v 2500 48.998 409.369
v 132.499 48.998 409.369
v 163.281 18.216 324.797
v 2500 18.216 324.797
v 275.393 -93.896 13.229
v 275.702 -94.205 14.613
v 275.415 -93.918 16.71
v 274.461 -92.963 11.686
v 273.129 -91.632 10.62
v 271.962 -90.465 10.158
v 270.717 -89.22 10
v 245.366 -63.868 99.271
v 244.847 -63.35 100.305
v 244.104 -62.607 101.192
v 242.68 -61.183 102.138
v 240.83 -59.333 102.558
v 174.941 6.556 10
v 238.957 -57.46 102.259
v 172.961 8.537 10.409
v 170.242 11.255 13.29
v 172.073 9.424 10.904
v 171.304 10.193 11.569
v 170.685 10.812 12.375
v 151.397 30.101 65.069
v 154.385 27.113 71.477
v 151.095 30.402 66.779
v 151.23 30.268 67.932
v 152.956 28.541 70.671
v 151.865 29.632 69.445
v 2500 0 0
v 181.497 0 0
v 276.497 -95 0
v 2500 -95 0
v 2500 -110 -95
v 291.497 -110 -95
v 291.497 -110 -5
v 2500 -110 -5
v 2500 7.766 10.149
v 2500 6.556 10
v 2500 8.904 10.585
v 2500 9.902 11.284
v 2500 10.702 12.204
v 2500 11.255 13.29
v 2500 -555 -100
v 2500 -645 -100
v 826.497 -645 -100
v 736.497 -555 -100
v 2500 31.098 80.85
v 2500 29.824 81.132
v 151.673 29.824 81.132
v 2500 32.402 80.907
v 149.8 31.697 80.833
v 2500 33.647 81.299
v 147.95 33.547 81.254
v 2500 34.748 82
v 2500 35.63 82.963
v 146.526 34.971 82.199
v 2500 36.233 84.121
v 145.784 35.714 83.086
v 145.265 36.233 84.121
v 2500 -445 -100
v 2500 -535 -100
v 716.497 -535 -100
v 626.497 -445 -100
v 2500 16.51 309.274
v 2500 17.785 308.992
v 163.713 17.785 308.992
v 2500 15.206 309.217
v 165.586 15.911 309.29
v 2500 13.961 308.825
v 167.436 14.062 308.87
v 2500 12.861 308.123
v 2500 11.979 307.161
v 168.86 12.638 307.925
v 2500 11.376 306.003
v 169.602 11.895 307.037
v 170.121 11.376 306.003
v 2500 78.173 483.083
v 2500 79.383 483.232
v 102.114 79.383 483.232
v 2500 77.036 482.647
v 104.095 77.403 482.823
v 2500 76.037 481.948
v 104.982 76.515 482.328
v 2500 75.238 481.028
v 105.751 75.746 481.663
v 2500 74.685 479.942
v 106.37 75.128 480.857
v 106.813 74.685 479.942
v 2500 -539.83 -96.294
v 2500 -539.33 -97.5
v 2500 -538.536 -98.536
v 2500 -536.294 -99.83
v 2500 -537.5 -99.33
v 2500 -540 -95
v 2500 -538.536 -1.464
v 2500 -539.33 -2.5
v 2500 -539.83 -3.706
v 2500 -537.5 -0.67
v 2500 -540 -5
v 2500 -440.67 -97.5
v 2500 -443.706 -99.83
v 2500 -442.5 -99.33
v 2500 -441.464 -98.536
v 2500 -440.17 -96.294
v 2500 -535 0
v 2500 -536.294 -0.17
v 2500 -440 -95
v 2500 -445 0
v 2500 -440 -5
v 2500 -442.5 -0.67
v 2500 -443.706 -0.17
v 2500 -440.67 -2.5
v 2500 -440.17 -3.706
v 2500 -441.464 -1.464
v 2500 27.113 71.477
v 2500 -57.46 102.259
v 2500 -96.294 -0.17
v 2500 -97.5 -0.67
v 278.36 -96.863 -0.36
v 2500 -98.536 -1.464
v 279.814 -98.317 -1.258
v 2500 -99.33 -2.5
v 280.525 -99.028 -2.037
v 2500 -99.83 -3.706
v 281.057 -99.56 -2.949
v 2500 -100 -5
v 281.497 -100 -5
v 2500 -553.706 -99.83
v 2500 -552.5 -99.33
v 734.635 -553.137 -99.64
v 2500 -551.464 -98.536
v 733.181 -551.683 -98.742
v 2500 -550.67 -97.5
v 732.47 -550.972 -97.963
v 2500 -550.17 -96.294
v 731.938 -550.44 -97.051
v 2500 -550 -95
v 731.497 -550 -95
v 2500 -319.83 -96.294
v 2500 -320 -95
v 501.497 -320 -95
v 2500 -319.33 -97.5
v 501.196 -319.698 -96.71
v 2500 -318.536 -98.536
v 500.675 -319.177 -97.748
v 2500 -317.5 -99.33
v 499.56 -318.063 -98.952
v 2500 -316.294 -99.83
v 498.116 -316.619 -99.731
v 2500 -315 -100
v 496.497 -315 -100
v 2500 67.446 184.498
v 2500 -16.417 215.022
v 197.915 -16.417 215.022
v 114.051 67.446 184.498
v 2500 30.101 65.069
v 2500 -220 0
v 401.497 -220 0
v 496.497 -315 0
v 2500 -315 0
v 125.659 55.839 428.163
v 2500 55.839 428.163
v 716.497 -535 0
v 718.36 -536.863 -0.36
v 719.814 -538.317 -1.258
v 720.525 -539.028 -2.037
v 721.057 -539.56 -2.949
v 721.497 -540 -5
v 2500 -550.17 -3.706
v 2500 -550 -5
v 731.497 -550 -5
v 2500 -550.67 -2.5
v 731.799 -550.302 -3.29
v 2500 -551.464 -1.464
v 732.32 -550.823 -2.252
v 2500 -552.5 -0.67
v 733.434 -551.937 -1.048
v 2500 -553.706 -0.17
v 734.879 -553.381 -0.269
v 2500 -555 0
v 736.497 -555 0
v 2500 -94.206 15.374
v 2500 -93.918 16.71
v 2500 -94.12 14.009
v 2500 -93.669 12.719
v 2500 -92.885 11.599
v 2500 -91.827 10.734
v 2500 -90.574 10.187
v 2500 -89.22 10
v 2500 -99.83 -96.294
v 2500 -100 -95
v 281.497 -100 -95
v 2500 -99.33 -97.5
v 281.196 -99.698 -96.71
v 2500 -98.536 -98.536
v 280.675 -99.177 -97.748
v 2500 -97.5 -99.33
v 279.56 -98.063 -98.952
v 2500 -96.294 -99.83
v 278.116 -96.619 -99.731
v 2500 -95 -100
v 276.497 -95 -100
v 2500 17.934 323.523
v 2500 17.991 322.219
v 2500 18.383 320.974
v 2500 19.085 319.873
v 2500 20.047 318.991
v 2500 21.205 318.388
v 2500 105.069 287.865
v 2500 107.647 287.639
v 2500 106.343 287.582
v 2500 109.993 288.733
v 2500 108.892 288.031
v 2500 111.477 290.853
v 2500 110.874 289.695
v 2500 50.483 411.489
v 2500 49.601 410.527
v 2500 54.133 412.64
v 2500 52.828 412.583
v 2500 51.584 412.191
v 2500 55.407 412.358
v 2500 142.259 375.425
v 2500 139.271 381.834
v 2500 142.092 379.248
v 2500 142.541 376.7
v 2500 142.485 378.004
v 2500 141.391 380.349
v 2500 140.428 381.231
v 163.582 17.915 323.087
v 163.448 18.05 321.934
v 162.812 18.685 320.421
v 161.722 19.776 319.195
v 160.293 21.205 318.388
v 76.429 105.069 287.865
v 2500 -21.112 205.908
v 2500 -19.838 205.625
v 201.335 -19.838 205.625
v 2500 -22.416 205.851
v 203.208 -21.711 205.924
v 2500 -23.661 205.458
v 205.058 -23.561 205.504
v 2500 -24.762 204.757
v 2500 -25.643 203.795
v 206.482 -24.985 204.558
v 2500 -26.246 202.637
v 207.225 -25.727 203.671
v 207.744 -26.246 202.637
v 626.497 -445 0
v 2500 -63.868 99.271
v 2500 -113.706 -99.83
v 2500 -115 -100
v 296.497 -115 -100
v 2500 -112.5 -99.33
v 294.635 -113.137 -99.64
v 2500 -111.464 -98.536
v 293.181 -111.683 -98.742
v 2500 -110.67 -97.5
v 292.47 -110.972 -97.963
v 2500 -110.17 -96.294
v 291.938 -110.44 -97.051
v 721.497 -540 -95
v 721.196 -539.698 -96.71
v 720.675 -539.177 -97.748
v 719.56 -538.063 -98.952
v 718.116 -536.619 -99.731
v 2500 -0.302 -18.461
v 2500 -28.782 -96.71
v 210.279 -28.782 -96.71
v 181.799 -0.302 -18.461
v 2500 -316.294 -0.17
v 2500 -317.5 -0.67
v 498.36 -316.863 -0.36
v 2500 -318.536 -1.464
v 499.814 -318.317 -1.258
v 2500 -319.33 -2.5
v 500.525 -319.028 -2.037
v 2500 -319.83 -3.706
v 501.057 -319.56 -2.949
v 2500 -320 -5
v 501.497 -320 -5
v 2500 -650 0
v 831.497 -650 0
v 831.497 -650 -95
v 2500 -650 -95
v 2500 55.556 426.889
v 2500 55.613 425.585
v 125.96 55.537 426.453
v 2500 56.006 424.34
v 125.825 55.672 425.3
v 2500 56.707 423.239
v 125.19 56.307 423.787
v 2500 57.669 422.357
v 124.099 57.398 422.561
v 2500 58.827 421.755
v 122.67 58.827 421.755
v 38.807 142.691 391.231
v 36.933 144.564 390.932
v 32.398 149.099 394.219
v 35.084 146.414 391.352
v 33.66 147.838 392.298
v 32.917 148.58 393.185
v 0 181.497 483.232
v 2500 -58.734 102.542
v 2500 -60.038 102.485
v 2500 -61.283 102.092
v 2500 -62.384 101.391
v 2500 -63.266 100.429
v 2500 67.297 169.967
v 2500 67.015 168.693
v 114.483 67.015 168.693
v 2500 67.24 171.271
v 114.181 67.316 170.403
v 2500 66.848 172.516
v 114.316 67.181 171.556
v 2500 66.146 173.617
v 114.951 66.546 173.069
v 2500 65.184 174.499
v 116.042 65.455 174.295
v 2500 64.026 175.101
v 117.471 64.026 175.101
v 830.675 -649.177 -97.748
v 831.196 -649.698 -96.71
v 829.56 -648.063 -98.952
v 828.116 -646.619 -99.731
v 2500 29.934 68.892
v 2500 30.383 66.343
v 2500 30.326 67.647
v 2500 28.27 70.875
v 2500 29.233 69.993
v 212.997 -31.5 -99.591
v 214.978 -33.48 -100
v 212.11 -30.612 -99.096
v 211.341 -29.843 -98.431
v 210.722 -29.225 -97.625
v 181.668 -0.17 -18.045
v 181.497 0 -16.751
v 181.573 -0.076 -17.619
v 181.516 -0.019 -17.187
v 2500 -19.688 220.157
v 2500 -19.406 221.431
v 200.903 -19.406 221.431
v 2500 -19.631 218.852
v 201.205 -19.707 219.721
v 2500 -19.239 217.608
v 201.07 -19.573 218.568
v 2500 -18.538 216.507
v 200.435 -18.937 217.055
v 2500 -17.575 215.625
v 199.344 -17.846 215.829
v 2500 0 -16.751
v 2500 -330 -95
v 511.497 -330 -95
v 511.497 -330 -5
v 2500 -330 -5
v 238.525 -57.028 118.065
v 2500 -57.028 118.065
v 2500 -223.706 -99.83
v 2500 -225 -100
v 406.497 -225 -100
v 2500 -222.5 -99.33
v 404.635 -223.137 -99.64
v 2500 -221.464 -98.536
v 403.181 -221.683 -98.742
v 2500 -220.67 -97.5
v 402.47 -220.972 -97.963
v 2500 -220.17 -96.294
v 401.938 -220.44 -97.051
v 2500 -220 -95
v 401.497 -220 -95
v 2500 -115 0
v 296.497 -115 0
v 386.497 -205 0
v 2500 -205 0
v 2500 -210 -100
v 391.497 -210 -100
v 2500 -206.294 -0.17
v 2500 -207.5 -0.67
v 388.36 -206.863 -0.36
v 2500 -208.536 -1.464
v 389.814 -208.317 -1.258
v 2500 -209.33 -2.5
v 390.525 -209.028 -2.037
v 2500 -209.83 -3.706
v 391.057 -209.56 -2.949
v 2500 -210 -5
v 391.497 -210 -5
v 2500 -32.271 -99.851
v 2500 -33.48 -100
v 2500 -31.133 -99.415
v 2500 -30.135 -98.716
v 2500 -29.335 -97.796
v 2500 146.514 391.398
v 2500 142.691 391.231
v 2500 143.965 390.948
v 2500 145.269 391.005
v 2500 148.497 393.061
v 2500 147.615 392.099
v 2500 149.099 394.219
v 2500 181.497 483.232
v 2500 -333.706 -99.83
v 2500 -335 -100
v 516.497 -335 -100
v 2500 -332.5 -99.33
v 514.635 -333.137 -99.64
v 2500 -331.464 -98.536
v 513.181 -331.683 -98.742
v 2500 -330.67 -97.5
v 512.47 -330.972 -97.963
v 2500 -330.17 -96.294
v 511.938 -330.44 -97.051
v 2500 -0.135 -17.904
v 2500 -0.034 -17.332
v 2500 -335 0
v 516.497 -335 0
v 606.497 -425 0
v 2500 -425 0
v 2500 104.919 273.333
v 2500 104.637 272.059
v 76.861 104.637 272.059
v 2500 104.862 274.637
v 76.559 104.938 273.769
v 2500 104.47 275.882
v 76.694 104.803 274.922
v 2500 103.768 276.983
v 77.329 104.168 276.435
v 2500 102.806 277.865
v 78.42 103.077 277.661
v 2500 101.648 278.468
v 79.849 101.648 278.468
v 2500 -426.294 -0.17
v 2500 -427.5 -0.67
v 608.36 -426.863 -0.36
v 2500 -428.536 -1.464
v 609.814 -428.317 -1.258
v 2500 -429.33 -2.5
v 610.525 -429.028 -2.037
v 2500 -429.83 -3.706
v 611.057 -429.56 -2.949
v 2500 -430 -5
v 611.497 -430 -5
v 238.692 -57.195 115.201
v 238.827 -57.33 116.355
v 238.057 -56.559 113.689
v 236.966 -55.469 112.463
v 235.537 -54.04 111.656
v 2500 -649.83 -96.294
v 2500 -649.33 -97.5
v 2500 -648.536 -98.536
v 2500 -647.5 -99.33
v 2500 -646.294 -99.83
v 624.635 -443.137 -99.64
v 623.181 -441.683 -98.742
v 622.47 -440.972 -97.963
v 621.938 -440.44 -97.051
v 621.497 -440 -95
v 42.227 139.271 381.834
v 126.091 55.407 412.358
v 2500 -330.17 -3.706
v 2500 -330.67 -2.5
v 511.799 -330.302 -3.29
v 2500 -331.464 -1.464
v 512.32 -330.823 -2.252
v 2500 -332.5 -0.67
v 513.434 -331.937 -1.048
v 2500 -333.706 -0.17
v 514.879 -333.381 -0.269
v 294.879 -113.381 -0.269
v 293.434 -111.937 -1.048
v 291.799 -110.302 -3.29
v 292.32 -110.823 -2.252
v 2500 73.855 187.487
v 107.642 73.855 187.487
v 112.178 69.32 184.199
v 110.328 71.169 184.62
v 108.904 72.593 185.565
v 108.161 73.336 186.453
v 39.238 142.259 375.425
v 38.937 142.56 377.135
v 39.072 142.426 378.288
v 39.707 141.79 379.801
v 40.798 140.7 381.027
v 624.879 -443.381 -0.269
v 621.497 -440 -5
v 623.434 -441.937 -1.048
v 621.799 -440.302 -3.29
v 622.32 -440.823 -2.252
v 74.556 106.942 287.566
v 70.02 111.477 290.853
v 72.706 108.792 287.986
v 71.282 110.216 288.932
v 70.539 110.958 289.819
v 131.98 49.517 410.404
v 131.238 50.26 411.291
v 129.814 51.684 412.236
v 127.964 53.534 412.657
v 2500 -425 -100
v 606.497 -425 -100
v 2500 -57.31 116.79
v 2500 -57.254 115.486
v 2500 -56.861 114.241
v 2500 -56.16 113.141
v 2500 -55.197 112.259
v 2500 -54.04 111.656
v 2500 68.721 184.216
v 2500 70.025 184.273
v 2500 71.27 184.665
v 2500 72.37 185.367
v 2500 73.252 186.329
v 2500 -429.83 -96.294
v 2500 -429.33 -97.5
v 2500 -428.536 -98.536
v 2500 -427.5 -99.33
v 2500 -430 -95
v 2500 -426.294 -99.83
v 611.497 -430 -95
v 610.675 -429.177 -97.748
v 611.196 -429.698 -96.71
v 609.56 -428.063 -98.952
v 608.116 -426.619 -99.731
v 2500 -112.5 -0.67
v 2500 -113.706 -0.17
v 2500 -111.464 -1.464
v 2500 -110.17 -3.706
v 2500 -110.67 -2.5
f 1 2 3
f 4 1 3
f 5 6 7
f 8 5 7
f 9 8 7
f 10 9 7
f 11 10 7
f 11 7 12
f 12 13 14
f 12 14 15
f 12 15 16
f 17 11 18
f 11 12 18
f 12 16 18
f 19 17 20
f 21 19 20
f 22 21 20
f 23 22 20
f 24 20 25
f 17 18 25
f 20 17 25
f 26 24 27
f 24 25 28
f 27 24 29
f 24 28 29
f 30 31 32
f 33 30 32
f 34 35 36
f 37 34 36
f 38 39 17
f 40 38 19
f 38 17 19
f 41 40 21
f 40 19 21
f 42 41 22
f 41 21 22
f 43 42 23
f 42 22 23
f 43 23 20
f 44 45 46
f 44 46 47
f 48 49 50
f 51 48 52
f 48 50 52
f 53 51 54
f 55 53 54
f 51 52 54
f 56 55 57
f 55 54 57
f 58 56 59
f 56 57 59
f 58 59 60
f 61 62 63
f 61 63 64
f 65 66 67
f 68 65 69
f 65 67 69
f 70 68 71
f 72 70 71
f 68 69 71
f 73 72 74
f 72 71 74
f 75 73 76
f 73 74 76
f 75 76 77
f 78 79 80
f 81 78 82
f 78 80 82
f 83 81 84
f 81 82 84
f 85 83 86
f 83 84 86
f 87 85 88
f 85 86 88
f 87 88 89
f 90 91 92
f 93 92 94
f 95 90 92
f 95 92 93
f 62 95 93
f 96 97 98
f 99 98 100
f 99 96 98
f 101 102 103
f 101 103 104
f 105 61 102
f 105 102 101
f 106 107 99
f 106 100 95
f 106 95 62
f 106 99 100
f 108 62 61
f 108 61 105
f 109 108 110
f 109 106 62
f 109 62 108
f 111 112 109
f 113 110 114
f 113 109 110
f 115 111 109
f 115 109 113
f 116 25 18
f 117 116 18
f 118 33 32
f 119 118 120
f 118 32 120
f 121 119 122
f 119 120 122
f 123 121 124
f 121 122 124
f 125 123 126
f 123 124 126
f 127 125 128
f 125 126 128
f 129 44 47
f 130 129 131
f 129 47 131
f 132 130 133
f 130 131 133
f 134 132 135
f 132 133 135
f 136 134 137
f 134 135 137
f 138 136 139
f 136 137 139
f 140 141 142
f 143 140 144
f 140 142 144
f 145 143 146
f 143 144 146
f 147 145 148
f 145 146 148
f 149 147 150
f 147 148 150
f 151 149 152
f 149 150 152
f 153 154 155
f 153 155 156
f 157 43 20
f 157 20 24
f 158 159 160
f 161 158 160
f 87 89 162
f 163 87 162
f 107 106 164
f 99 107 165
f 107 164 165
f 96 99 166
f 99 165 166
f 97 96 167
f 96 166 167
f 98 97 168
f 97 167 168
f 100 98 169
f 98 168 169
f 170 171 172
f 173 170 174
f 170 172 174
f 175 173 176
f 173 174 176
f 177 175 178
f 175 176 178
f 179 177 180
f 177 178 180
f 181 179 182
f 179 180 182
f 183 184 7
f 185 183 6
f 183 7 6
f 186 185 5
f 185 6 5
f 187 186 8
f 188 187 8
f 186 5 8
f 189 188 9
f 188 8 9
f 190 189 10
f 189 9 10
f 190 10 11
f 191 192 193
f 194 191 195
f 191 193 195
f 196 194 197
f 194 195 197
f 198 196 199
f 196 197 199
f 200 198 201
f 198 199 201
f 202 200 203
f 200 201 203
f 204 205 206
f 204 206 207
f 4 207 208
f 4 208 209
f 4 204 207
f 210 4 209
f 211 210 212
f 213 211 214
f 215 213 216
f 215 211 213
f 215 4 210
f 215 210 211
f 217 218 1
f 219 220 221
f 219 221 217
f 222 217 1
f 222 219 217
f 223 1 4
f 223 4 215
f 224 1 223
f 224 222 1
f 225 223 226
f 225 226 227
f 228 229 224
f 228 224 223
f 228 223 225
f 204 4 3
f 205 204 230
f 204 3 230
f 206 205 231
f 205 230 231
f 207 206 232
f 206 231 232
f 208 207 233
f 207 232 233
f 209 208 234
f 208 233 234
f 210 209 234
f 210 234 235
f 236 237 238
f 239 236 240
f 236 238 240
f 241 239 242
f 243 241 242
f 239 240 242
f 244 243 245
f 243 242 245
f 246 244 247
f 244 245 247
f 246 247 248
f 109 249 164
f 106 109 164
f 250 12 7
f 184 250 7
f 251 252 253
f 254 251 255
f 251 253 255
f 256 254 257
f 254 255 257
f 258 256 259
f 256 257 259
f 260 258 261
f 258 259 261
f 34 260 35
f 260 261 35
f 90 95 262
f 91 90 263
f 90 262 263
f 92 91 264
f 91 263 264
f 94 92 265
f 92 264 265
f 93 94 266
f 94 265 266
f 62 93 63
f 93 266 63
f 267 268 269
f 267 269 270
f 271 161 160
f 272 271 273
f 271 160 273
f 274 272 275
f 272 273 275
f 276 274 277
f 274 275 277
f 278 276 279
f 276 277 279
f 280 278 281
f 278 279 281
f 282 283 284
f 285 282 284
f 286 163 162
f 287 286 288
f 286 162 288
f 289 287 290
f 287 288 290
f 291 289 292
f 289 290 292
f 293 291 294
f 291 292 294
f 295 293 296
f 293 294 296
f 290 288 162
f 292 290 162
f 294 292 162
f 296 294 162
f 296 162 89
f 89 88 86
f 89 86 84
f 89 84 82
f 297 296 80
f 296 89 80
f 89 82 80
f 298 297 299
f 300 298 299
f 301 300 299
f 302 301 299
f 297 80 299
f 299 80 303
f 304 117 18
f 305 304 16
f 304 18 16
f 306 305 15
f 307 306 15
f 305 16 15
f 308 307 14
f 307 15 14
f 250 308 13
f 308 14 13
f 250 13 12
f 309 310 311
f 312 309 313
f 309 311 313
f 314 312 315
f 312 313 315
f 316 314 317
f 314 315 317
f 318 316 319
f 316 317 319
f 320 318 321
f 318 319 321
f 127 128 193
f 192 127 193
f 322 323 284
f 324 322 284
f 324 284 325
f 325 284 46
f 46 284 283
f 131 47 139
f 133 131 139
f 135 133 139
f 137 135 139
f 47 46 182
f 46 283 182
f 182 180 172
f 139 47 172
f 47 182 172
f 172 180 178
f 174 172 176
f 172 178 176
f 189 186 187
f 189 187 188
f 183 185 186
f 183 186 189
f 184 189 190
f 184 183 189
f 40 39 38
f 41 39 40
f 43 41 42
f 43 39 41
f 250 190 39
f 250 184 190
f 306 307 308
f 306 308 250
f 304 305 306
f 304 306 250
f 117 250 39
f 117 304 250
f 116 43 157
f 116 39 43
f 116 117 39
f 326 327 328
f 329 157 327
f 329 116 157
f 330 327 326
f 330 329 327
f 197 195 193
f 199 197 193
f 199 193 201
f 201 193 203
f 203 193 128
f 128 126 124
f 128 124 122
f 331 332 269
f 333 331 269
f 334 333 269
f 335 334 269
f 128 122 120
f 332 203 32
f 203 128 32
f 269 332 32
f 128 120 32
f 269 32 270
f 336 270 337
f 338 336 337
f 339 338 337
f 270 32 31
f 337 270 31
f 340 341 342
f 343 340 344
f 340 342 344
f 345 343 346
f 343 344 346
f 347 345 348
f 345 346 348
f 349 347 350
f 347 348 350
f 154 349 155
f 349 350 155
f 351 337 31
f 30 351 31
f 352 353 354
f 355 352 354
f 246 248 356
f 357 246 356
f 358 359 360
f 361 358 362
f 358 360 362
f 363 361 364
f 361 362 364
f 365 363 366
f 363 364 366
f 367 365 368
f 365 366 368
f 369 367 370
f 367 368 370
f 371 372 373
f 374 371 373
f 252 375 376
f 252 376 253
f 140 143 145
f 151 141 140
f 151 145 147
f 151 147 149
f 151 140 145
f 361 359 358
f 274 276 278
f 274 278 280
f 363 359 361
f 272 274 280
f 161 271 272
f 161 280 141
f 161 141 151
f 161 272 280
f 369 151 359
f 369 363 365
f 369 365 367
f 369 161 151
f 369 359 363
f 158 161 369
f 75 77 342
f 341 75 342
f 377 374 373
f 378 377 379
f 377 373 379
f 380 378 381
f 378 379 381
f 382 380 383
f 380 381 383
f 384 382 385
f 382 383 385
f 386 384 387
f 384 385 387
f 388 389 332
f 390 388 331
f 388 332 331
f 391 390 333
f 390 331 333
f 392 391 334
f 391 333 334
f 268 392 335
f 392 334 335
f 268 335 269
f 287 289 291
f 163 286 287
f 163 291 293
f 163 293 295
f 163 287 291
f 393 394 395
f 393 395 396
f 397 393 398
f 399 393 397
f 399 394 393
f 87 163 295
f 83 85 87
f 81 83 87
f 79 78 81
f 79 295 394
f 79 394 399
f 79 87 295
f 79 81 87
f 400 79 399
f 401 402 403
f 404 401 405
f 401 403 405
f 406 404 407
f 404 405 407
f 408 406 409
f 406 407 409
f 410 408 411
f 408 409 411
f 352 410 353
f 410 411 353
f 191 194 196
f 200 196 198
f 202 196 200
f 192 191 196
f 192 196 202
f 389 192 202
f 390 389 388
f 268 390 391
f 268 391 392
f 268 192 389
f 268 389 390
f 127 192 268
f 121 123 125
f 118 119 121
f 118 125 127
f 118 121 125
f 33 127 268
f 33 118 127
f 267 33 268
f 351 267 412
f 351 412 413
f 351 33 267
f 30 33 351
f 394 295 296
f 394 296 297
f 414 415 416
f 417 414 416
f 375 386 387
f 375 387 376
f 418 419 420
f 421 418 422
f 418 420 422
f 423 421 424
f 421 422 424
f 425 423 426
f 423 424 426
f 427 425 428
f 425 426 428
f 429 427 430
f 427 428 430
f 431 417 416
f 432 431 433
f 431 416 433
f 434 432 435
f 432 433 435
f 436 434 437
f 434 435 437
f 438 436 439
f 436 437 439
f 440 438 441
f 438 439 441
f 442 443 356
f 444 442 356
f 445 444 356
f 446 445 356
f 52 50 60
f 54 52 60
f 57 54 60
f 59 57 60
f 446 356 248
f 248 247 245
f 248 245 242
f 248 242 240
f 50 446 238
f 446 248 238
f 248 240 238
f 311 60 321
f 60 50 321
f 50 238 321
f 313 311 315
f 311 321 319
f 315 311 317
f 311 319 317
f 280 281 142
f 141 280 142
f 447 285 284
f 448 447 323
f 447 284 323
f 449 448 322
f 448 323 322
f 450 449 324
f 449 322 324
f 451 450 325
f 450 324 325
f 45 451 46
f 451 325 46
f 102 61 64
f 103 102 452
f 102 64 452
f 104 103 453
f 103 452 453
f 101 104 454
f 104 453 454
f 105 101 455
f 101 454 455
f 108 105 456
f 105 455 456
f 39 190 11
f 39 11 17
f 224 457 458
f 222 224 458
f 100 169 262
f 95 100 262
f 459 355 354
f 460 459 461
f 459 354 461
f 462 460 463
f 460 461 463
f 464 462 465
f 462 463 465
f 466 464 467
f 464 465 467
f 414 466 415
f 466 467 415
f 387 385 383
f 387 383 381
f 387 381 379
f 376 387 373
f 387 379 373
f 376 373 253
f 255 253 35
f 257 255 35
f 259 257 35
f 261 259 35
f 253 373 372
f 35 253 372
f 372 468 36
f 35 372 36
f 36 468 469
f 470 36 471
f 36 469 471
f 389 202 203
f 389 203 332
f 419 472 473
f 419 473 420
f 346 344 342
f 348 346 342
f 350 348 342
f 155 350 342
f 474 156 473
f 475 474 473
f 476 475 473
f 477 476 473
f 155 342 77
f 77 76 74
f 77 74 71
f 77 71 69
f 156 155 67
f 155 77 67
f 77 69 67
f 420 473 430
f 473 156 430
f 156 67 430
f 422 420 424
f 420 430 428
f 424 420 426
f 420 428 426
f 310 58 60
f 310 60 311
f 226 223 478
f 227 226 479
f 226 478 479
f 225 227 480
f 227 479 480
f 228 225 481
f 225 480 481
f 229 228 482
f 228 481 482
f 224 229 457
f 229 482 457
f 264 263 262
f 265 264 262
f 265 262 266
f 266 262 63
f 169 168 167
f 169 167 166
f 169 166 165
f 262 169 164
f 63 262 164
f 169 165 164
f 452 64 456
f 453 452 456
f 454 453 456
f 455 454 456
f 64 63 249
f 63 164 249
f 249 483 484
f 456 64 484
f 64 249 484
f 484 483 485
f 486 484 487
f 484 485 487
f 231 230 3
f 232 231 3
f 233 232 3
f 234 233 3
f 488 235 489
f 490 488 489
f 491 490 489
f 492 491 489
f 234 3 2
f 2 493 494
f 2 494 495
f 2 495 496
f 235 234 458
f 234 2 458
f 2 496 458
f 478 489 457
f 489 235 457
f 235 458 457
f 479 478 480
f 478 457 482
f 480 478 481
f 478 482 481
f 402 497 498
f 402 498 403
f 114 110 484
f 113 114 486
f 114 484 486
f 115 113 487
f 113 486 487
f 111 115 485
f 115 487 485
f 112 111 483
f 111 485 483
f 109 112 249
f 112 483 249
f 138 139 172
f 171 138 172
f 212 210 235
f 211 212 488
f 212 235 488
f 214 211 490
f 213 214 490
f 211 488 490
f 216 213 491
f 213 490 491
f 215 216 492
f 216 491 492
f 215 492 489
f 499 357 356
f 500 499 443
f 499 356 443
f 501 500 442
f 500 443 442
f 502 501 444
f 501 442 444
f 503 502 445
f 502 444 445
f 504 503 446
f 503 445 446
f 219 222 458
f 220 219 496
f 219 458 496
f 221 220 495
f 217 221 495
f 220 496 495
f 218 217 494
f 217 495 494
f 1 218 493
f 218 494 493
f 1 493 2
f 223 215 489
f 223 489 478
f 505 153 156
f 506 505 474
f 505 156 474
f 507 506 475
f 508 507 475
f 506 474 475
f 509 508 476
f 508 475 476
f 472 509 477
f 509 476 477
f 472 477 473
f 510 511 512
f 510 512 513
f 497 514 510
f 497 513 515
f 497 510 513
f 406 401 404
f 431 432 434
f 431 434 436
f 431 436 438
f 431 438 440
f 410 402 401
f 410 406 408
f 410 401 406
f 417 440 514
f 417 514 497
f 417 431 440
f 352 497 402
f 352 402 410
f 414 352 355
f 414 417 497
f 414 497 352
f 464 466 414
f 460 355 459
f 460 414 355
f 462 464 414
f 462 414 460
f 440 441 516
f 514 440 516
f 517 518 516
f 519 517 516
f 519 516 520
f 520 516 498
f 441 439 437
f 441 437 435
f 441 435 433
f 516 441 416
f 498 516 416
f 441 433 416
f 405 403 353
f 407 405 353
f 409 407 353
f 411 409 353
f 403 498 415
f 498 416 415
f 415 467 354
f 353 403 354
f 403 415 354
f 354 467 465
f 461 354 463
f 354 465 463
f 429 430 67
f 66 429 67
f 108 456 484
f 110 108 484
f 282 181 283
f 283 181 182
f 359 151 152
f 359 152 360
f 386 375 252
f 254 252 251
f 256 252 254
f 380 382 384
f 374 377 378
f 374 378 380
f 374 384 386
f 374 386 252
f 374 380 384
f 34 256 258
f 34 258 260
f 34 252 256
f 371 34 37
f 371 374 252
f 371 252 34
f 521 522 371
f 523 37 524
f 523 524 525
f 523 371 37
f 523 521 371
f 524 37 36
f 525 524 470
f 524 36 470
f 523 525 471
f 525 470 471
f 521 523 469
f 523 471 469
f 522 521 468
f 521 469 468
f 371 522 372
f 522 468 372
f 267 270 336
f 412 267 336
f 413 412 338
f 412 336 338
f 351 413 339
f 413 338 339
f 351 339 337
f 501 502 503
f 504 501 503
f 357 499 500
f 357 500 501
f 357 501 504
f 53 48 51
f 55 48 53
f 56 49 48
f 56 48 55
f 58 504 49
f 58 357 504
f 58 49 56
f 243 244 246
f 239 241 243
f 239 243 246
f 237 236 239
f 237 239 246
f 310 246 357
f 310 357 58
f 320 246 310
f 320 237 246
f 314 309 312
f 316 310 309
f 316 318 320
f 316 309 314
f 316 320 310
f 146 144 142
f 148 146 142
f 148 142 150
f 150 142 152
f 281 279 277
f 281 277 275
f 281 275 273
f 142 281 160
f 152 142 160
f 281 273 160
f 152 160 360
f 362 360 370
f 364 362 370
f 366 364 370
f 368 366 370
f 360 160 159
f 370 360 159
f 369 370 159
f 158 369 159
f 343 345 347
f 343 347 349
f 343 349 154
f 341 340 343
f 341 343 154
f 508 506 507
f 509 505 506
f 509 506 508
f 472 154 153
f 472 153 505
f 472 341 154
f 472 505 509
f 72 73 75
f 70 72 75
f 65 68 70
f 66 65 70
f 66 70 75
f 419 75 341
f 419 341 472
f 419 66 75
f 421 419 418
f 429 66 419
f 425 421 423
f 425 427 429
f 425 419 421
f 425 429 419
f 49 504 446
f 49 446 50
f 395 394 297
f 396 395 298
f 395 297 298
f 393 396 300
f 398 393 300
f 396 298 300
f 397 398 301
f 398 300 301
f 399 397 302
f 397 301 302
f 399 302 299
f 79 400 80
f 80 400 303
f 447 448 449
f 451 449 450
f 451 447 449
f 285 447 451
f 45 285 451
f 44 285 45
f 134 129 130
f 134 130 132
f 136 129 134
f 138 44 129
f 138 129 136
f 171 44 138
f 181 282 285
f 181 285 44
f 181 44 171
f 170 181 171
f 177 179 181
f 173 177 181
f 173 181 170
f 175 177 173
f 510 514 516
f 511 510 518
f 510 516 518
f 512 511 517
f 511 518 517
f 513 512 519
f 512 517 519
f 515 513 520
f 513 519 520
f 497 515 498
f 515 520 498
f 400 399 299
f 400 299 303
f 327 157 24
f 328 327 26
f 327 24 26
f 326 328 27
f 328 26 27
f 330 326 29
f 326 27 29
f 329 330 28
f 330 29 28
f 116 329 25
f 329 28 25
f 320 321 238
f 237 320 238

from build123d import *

# Parameters (mm, degrees)
F1_DEPTH = 2500
F3_DEPTH = 583.2330008918


# Not quite as in the source:
# - a feature names something its author has since deleted; it is built from what else it names


with BuildPart() as f1:
    # F0 (on Right) → F1 (new body)
    with BuildSketch(Plane.YZ):
        with BuildLine():
            Line((0, -16.7510631673), (0, 0))
            Line((0, 0), (-95, 0))
            ThreePointArc((-95, 0), (-98.5355339059, -1.4644660941), (-100, -5))
            Line((-100, -5), (-100, -95))
            ThreePointArc((-100, -95), (-98.5355339059, -98.5355339059), (-95, -100))
            Line((-95, -100), (-33.4802838701, -100))
            ThreePointArc((-33.4802838701, -100), (-30.6124016883, -99.0957602214), (-28.7818207661, -96.7101007166))
            Line((-28.7818207661, -96.7101007166), (-0.3015368961, -18.4611638839))
            ThreePointArc((-0.3015368961, -18.4611638839), (-0.0759612349, -17.6193040556), (0, -16.7510631673))
        make_face()
    extrude(amount=F1_DEPTH)


with BuildPart() as f1b:
    # F0 (on Right) → F1, piece 2 (new body)
    with BuildSketch(Plane.YZ):
        with BuildLine():
            ThreePointArc((-110, -5), (-111.4644660941, -1.4644660941), (-115, 0))
            Line((-115, 0), (-205, 0))
            ThreePointArc((-205, 0), (-208.5355339059, -1.4644660941), (-210, -5))
            Line((-210, -5), (-210, -100))
            Line((-210, -100), (-115, -100))
            ThreePointArc((-115, -100), (-111.4644660941, -98.5355339059), (-110, -95))
            Line((-110, -95), (-110, -5))
        make_face()
    extrude(amount=F1_DEPTH)


with BuildPart() as f1c:
    # F0 (on Right) → F1, piece 3 (new body)
    with BuildSketch(Plane.YZ):
        with BuildLine():
            Line((-220, -95), (-220, 0))
            Line((-220, 0), (-315, 0))
            ThreePointArc((-315, 0), (-318.5355339059, -1.4644660941), (-320, -5))
            Line((-320, -5), (-320, -95))
            ThreePointArc((-320, -95), (-318.5355339059, -98.5355339059), (-315, -100))
            Line((-315, -100), (-225, -100))
            ThreePointArc((-225, -100), (-221.4644660941, -98.5355339059), (-220, -95))
        make_face()
    extrude(amount=F1_DEPTH)


with BuildPart() as f1d:
    # F0 (on Right) → F1, piece 4 (new body)
    with BuildSketch(Plane.YZ):
        with BuildLine():
            ThreePointArc((-330, -5), (-331.4644660941, -1.4644660941), (-335, 0))
            Line((-335, 0), (-425, 0))
            ThreePointArc((-425, 0), (-428.5355339059, -1.4644660941), (-430, -5))
            Line((-430, -5), (-430, -95))
            ThreePointArc((-430, -95), (-428.5355339059, -98.5355339059), (-425, -100))
            Line((-425, -100), (-335, -100))
            ThreePointArc((-335, -100), (-331.4644660941, -98.5355339059), (-330, -95))
            Line((-330, -95), (-330, -5))
        make_face()
    extrude(amount=F1_DEPTH)


with BuildPart() as f1e:
    # F0 (on Right) → F1, piece 5 (new body)
    with BuildSketch(Plane.YZ):
        with BuildLine():
            ThreePointArc((-440, -5), (-441.4644660941, -1.4644660941), (-445, 0))
            Line((-445, 0), (-535, 0))
            ThreePointArc((-535, 0), (-538.5355339059, -1.4644660941), (-540, -5))
            Line((-540, -5), (-540, -95))
            ThreePointArc((-540, -95), (-538.5355339059, -98.5355339059), (-535, -100))
            Line((-535, -100), (-445, -100))
            ThreePointArc((-445, -100), (-441.4644660941, -98.5355339059), (-440, -95))
            Line((-440, -95), (-440, -5))
        make_face()
    extrude(amount=F1_DEPTH)


with BuildPart() as f1f:
    # F0 (on Right) → F1, piece 6 (new body)
    with BuildSketch(Plane.YZ):
        with BuildLine():
            ThreePointArc((-550, -5), (-551.4644660941, -1.4644660941), (-555, 0))
            Line((-555, 0), (-650, 0))
            Line((-650, 0), (-650, -95))
            ThreePointArc((-650, -95), (-648.5355339059, -98.5355339059), (-645, -100))
            Line((-645, -100), (-555, -100))
            ThreePointArc((-555, -100), (-551.4644660941, -98.5355339059), (-550, -95))
            Line((-550, -95), (-550, -5))
        make_face()
    extrude(amount=F1_DEPTH)


with BuildPart() as f1g:
    # F0 (on Right) → F1, piece 7 (new body)
    with BuildSketch(Plane.YZ):
        with BuildLine():
            Line((-63.8683840414, 99.2707989747), (-93.9180207276, 16.7101007166))
            ThreePointArc((-93.9180207276, 16.7101007166), (-93.3153178451, 12.1321178182), (-89.2195576236, 10))
            Line((-89.2195576236, 10), (6.5564418992, 10))
            ThreePointArc((6.5564418992, 10), (9.424324081, 10.9042397786), (11.2549050031, 13.2898992834))
            Line((11.2549050031, 13.2898992834), (30.1008780372, 65.0687846421))
            ThreePointArc((30.1008780372, 65.0687846421), (29.9339538684, 68.8919766674), (27.1125156499, 71.4773484627))
            Line((27.1125156499, 71.4773484627), (-57.4598202208, 102.259161362))
            ThreePointArc((-57.4598202208, 102.259161362), (-61.2830122462, 102.0922371932), (-63.8683840414, 99.2707989747))
        make_face()
    extrude(amount=F1_DEPTH)


with BuildPart() as f1h:
    # F0 (on Right) → F1, piece 8 (new body)
    with BuildSketch(Plane.YZ):
        with BuildLine():
            ThreePointArc((-57.0279811749, 118.0646513904), (-56.8610570061, 114.241459365), (-54.0396187876, 111.6560875698))
            Line((-54.0396187876, 111.6560875698), (29.8241305782, 81.1321790667))
            ThreePointArc((29.8241305782, 81.1321790667), (33.6473226035, 81.2991032355), (36.2326943987, 84.120541454))
            Line((36.2326943987, 84.120541454), (67.014507298, 168.6928773248))
            ThreePointArc((67.014507298, 168.6928773248), (66.8475831293, 172.5160693501), (64.0261449107, 175.1014411453))
            Line((64.0261449107, 175.1014411453), (-19.837604455, 205.6253496484))
            ThreePointArc((-19.837604455, 205.6253496484), (-23.6607964803, 205.4584254797), (-26.2461682756, 202.6369872611))
            Line((-26.2461682756, 202.6369872611), (-57.0279811749, 118.0646513904))
        make_face()
    extrude(amount=F1_DEPTH)


with BuildPart() as f1i:
    # F0 (on Right) → F1, piece 9 (new body)
    with BuildSketch(Plane.YZ):
        with BuildLine():
            Line((11.3760474902, 306.0031755476), (-19.4057654091, 221.4308396768))
            ThreePointArc((-19.4057654091, 221.4308396768), (-19.2388412403, 217.6076476515), (-16.4174030218, 215.0222758563))
            Line((-16.4174030218, 215.0222758563), (67.446346344, 184.4983673532))
            ThreePointArc((67.446346344, 184.4983673532), (71.2695383693, 184.6652915219), (73.8549101645, 187.4867297405))
            Line((73.8549101645, 187.4867297405), (104.6367230638, 272.0590656112))
            ThreePointArc((104.6367230638, 272.0590656112), (104.4697988951, 275.8822576365), (101.6483606765, 278.4676294318))
            Line((101.6483606765, 278.4676294318), (17.7846113108, 308.9915379349))
            ThreePointArc((17.7846113108, 308.9915379349), (13.9614192855, 308.8246137661), (11.3760474902, 306.0031755476))
        make_face()
    extrude(amount=F1_DEPTH)


with BuildPart() as f1j:
    # F0 (on Right) → F1, piece 10 (new body)
    with BuildSketch(Plane.YZ):
        with BuildLine():
            Line((149.0993416962, 394.2191063134), (181.4973857886, 483.2320008918))
            Line((181.4973857886, 483.2320008918), (79.3831022606, 483.2320008918))
            ThreePointArc((79.3831022606, 483.2320008918), (76.5152200788, 482.3277611133), (74.6846391566, 479.9421016085))
            Line((74.6846391566, 479.9421016085), (55.8386661226, 428.1632162497))
            ThreePointArc((55.8386661226, 428.1632162497), (56.0055902913, 424.3400242244), (58.8270285099, 421.7546524292))
            Line((58.8270285099, 421.7546524292), (142.6907778756, 391.2307439261))
            ThreePointArc((142.6907778756, 391.2307439261), (146.513969901, 391.3976680948), (149.0993416962, 394.2191063134))
        make_face()
    extrude(amount=F1_DEPTH)


with BuildPart() as f1k:
    # F0 (on Right) → F1, piece 11 (new body)
    with BuildSketch(Plane.YZ):
        with BuildLine():
            ThreePointArc((18.2164503568, 324.7970279633), (18.3833745255, 320.9738359379), (21.2048127441, 318.3884641427))
            Line((21.2048127441, 318.3884641427), (105.0685621098, 287.8645556396))
            ThreePointArc((105.0685621098, 287.8645556396), (108.8917541351, 288.0314798084), (111.4771259304, 290.8529180269))
            Line((111.4771259304, 290.8529180269), (142.2589388297, 375.4252538977))
            ThreePointArc((142.2589388297, 375.4252538977), (142.0920146609, 379.248445923), (139.2705764424, 381.8338177182))
            Line((139.2705764424, 381.8338177182), (55.4068270766, 412.3577262213))
            ThreePointArc((55.4068270766, 412.3577262213), (51.5836350513, 412.1908020526), (48.9982632561, 409.369363834))
            Line((48.9982632561, 409.369363834), (18.2164503568, 324.7970279633))
        make_face()
    extrude(amount=F1_DEPTH)


with BuildPart() as f3_tool:
    # F2 (on face) → F3 (new body, through all)
    with BuildSketch(Plane.XY.offset(483.2320008918)):
        Polygon((0, 181.4973857886), (0, 79.3831022606), (102.114283528, 79.3831022606), align=None)
        Polygon((0, 79.3831022606), (0, -651.0000042114), (832.49739, -651.0000042114), (102.114283528, 79.3831022606), align=None)
    extrude(amount=-F3_DEPTH)


with BuildPart() as f1_1:
    add(f1.part)

    # F3: cut by f3_tool
    add(f3_tool.part, mode=Mode.SUBTRACT)


with BuildPart() as f1b_1:
    add(f1b.part)

    # F3: cut by f3_tool
    add(f3_tool.part, mode=Mode.SUBTRACT)


with BuildPart() as f1c_1:
    add(f1c.part)

    # F3: cut by f3_tool
    add(f3_tool.part, mode=Mode.SUBTRACT)


with BuildPart() as f1d_1:
    add(f1d.part)

    # F3: cut by f3_tool
    add(f3_tool.part, mode=Mode.SUBTRACT)


with BuildPart() as f1e_1:
    add(f1e.part)

    # F3: cut by f3_tool
    add(f3_tool.part, mode=Mode.SUBTRACT)


with BuildPart() as f1f_1:
    add(f1f.part)

    # F3: cut by f3_tool
    add(f3_tool.part, mode=Mode.SUBTRACT)


with BuildPart() as f1g_1:
    add(f1g.part)

    # F3: cut by f3_tool
    add(f3_tool.part, mode=Mode.SUBTRACT)


with BuildPart() as f1h_1:
    add(f1h.part)

    # F3: cut by f3_tool
    add(f3_tool.part, mode=Mode.SUBTRACT)


with BuildPart() as f1i_1:
    add(f1i.part)

    # F3: cut by f3_tool
    add(f3_tool.part, mode=Mode.SUBTRACT)


with BuildPart() as f1j_1:
    add(f1j.part)

    # F3: cut by f3_tool
    add(f3_tool.part, mode=Mode.SUBTRACT)


with BuildPart() as f1k_1:
    add(f1k.part)

    # F3: cut by f3_tool
    add(f3_tool.part, mode=Mode.SUBTRACT)


solid = Compound([f1_1.part, f1b_1.part, f1c_1.part, f1d_1.part, f1e_1.part, f1f_1.part, f1g_1.part, f1h_1.part, f1i_1.part, f1j_1.part, f1k_1.part])
